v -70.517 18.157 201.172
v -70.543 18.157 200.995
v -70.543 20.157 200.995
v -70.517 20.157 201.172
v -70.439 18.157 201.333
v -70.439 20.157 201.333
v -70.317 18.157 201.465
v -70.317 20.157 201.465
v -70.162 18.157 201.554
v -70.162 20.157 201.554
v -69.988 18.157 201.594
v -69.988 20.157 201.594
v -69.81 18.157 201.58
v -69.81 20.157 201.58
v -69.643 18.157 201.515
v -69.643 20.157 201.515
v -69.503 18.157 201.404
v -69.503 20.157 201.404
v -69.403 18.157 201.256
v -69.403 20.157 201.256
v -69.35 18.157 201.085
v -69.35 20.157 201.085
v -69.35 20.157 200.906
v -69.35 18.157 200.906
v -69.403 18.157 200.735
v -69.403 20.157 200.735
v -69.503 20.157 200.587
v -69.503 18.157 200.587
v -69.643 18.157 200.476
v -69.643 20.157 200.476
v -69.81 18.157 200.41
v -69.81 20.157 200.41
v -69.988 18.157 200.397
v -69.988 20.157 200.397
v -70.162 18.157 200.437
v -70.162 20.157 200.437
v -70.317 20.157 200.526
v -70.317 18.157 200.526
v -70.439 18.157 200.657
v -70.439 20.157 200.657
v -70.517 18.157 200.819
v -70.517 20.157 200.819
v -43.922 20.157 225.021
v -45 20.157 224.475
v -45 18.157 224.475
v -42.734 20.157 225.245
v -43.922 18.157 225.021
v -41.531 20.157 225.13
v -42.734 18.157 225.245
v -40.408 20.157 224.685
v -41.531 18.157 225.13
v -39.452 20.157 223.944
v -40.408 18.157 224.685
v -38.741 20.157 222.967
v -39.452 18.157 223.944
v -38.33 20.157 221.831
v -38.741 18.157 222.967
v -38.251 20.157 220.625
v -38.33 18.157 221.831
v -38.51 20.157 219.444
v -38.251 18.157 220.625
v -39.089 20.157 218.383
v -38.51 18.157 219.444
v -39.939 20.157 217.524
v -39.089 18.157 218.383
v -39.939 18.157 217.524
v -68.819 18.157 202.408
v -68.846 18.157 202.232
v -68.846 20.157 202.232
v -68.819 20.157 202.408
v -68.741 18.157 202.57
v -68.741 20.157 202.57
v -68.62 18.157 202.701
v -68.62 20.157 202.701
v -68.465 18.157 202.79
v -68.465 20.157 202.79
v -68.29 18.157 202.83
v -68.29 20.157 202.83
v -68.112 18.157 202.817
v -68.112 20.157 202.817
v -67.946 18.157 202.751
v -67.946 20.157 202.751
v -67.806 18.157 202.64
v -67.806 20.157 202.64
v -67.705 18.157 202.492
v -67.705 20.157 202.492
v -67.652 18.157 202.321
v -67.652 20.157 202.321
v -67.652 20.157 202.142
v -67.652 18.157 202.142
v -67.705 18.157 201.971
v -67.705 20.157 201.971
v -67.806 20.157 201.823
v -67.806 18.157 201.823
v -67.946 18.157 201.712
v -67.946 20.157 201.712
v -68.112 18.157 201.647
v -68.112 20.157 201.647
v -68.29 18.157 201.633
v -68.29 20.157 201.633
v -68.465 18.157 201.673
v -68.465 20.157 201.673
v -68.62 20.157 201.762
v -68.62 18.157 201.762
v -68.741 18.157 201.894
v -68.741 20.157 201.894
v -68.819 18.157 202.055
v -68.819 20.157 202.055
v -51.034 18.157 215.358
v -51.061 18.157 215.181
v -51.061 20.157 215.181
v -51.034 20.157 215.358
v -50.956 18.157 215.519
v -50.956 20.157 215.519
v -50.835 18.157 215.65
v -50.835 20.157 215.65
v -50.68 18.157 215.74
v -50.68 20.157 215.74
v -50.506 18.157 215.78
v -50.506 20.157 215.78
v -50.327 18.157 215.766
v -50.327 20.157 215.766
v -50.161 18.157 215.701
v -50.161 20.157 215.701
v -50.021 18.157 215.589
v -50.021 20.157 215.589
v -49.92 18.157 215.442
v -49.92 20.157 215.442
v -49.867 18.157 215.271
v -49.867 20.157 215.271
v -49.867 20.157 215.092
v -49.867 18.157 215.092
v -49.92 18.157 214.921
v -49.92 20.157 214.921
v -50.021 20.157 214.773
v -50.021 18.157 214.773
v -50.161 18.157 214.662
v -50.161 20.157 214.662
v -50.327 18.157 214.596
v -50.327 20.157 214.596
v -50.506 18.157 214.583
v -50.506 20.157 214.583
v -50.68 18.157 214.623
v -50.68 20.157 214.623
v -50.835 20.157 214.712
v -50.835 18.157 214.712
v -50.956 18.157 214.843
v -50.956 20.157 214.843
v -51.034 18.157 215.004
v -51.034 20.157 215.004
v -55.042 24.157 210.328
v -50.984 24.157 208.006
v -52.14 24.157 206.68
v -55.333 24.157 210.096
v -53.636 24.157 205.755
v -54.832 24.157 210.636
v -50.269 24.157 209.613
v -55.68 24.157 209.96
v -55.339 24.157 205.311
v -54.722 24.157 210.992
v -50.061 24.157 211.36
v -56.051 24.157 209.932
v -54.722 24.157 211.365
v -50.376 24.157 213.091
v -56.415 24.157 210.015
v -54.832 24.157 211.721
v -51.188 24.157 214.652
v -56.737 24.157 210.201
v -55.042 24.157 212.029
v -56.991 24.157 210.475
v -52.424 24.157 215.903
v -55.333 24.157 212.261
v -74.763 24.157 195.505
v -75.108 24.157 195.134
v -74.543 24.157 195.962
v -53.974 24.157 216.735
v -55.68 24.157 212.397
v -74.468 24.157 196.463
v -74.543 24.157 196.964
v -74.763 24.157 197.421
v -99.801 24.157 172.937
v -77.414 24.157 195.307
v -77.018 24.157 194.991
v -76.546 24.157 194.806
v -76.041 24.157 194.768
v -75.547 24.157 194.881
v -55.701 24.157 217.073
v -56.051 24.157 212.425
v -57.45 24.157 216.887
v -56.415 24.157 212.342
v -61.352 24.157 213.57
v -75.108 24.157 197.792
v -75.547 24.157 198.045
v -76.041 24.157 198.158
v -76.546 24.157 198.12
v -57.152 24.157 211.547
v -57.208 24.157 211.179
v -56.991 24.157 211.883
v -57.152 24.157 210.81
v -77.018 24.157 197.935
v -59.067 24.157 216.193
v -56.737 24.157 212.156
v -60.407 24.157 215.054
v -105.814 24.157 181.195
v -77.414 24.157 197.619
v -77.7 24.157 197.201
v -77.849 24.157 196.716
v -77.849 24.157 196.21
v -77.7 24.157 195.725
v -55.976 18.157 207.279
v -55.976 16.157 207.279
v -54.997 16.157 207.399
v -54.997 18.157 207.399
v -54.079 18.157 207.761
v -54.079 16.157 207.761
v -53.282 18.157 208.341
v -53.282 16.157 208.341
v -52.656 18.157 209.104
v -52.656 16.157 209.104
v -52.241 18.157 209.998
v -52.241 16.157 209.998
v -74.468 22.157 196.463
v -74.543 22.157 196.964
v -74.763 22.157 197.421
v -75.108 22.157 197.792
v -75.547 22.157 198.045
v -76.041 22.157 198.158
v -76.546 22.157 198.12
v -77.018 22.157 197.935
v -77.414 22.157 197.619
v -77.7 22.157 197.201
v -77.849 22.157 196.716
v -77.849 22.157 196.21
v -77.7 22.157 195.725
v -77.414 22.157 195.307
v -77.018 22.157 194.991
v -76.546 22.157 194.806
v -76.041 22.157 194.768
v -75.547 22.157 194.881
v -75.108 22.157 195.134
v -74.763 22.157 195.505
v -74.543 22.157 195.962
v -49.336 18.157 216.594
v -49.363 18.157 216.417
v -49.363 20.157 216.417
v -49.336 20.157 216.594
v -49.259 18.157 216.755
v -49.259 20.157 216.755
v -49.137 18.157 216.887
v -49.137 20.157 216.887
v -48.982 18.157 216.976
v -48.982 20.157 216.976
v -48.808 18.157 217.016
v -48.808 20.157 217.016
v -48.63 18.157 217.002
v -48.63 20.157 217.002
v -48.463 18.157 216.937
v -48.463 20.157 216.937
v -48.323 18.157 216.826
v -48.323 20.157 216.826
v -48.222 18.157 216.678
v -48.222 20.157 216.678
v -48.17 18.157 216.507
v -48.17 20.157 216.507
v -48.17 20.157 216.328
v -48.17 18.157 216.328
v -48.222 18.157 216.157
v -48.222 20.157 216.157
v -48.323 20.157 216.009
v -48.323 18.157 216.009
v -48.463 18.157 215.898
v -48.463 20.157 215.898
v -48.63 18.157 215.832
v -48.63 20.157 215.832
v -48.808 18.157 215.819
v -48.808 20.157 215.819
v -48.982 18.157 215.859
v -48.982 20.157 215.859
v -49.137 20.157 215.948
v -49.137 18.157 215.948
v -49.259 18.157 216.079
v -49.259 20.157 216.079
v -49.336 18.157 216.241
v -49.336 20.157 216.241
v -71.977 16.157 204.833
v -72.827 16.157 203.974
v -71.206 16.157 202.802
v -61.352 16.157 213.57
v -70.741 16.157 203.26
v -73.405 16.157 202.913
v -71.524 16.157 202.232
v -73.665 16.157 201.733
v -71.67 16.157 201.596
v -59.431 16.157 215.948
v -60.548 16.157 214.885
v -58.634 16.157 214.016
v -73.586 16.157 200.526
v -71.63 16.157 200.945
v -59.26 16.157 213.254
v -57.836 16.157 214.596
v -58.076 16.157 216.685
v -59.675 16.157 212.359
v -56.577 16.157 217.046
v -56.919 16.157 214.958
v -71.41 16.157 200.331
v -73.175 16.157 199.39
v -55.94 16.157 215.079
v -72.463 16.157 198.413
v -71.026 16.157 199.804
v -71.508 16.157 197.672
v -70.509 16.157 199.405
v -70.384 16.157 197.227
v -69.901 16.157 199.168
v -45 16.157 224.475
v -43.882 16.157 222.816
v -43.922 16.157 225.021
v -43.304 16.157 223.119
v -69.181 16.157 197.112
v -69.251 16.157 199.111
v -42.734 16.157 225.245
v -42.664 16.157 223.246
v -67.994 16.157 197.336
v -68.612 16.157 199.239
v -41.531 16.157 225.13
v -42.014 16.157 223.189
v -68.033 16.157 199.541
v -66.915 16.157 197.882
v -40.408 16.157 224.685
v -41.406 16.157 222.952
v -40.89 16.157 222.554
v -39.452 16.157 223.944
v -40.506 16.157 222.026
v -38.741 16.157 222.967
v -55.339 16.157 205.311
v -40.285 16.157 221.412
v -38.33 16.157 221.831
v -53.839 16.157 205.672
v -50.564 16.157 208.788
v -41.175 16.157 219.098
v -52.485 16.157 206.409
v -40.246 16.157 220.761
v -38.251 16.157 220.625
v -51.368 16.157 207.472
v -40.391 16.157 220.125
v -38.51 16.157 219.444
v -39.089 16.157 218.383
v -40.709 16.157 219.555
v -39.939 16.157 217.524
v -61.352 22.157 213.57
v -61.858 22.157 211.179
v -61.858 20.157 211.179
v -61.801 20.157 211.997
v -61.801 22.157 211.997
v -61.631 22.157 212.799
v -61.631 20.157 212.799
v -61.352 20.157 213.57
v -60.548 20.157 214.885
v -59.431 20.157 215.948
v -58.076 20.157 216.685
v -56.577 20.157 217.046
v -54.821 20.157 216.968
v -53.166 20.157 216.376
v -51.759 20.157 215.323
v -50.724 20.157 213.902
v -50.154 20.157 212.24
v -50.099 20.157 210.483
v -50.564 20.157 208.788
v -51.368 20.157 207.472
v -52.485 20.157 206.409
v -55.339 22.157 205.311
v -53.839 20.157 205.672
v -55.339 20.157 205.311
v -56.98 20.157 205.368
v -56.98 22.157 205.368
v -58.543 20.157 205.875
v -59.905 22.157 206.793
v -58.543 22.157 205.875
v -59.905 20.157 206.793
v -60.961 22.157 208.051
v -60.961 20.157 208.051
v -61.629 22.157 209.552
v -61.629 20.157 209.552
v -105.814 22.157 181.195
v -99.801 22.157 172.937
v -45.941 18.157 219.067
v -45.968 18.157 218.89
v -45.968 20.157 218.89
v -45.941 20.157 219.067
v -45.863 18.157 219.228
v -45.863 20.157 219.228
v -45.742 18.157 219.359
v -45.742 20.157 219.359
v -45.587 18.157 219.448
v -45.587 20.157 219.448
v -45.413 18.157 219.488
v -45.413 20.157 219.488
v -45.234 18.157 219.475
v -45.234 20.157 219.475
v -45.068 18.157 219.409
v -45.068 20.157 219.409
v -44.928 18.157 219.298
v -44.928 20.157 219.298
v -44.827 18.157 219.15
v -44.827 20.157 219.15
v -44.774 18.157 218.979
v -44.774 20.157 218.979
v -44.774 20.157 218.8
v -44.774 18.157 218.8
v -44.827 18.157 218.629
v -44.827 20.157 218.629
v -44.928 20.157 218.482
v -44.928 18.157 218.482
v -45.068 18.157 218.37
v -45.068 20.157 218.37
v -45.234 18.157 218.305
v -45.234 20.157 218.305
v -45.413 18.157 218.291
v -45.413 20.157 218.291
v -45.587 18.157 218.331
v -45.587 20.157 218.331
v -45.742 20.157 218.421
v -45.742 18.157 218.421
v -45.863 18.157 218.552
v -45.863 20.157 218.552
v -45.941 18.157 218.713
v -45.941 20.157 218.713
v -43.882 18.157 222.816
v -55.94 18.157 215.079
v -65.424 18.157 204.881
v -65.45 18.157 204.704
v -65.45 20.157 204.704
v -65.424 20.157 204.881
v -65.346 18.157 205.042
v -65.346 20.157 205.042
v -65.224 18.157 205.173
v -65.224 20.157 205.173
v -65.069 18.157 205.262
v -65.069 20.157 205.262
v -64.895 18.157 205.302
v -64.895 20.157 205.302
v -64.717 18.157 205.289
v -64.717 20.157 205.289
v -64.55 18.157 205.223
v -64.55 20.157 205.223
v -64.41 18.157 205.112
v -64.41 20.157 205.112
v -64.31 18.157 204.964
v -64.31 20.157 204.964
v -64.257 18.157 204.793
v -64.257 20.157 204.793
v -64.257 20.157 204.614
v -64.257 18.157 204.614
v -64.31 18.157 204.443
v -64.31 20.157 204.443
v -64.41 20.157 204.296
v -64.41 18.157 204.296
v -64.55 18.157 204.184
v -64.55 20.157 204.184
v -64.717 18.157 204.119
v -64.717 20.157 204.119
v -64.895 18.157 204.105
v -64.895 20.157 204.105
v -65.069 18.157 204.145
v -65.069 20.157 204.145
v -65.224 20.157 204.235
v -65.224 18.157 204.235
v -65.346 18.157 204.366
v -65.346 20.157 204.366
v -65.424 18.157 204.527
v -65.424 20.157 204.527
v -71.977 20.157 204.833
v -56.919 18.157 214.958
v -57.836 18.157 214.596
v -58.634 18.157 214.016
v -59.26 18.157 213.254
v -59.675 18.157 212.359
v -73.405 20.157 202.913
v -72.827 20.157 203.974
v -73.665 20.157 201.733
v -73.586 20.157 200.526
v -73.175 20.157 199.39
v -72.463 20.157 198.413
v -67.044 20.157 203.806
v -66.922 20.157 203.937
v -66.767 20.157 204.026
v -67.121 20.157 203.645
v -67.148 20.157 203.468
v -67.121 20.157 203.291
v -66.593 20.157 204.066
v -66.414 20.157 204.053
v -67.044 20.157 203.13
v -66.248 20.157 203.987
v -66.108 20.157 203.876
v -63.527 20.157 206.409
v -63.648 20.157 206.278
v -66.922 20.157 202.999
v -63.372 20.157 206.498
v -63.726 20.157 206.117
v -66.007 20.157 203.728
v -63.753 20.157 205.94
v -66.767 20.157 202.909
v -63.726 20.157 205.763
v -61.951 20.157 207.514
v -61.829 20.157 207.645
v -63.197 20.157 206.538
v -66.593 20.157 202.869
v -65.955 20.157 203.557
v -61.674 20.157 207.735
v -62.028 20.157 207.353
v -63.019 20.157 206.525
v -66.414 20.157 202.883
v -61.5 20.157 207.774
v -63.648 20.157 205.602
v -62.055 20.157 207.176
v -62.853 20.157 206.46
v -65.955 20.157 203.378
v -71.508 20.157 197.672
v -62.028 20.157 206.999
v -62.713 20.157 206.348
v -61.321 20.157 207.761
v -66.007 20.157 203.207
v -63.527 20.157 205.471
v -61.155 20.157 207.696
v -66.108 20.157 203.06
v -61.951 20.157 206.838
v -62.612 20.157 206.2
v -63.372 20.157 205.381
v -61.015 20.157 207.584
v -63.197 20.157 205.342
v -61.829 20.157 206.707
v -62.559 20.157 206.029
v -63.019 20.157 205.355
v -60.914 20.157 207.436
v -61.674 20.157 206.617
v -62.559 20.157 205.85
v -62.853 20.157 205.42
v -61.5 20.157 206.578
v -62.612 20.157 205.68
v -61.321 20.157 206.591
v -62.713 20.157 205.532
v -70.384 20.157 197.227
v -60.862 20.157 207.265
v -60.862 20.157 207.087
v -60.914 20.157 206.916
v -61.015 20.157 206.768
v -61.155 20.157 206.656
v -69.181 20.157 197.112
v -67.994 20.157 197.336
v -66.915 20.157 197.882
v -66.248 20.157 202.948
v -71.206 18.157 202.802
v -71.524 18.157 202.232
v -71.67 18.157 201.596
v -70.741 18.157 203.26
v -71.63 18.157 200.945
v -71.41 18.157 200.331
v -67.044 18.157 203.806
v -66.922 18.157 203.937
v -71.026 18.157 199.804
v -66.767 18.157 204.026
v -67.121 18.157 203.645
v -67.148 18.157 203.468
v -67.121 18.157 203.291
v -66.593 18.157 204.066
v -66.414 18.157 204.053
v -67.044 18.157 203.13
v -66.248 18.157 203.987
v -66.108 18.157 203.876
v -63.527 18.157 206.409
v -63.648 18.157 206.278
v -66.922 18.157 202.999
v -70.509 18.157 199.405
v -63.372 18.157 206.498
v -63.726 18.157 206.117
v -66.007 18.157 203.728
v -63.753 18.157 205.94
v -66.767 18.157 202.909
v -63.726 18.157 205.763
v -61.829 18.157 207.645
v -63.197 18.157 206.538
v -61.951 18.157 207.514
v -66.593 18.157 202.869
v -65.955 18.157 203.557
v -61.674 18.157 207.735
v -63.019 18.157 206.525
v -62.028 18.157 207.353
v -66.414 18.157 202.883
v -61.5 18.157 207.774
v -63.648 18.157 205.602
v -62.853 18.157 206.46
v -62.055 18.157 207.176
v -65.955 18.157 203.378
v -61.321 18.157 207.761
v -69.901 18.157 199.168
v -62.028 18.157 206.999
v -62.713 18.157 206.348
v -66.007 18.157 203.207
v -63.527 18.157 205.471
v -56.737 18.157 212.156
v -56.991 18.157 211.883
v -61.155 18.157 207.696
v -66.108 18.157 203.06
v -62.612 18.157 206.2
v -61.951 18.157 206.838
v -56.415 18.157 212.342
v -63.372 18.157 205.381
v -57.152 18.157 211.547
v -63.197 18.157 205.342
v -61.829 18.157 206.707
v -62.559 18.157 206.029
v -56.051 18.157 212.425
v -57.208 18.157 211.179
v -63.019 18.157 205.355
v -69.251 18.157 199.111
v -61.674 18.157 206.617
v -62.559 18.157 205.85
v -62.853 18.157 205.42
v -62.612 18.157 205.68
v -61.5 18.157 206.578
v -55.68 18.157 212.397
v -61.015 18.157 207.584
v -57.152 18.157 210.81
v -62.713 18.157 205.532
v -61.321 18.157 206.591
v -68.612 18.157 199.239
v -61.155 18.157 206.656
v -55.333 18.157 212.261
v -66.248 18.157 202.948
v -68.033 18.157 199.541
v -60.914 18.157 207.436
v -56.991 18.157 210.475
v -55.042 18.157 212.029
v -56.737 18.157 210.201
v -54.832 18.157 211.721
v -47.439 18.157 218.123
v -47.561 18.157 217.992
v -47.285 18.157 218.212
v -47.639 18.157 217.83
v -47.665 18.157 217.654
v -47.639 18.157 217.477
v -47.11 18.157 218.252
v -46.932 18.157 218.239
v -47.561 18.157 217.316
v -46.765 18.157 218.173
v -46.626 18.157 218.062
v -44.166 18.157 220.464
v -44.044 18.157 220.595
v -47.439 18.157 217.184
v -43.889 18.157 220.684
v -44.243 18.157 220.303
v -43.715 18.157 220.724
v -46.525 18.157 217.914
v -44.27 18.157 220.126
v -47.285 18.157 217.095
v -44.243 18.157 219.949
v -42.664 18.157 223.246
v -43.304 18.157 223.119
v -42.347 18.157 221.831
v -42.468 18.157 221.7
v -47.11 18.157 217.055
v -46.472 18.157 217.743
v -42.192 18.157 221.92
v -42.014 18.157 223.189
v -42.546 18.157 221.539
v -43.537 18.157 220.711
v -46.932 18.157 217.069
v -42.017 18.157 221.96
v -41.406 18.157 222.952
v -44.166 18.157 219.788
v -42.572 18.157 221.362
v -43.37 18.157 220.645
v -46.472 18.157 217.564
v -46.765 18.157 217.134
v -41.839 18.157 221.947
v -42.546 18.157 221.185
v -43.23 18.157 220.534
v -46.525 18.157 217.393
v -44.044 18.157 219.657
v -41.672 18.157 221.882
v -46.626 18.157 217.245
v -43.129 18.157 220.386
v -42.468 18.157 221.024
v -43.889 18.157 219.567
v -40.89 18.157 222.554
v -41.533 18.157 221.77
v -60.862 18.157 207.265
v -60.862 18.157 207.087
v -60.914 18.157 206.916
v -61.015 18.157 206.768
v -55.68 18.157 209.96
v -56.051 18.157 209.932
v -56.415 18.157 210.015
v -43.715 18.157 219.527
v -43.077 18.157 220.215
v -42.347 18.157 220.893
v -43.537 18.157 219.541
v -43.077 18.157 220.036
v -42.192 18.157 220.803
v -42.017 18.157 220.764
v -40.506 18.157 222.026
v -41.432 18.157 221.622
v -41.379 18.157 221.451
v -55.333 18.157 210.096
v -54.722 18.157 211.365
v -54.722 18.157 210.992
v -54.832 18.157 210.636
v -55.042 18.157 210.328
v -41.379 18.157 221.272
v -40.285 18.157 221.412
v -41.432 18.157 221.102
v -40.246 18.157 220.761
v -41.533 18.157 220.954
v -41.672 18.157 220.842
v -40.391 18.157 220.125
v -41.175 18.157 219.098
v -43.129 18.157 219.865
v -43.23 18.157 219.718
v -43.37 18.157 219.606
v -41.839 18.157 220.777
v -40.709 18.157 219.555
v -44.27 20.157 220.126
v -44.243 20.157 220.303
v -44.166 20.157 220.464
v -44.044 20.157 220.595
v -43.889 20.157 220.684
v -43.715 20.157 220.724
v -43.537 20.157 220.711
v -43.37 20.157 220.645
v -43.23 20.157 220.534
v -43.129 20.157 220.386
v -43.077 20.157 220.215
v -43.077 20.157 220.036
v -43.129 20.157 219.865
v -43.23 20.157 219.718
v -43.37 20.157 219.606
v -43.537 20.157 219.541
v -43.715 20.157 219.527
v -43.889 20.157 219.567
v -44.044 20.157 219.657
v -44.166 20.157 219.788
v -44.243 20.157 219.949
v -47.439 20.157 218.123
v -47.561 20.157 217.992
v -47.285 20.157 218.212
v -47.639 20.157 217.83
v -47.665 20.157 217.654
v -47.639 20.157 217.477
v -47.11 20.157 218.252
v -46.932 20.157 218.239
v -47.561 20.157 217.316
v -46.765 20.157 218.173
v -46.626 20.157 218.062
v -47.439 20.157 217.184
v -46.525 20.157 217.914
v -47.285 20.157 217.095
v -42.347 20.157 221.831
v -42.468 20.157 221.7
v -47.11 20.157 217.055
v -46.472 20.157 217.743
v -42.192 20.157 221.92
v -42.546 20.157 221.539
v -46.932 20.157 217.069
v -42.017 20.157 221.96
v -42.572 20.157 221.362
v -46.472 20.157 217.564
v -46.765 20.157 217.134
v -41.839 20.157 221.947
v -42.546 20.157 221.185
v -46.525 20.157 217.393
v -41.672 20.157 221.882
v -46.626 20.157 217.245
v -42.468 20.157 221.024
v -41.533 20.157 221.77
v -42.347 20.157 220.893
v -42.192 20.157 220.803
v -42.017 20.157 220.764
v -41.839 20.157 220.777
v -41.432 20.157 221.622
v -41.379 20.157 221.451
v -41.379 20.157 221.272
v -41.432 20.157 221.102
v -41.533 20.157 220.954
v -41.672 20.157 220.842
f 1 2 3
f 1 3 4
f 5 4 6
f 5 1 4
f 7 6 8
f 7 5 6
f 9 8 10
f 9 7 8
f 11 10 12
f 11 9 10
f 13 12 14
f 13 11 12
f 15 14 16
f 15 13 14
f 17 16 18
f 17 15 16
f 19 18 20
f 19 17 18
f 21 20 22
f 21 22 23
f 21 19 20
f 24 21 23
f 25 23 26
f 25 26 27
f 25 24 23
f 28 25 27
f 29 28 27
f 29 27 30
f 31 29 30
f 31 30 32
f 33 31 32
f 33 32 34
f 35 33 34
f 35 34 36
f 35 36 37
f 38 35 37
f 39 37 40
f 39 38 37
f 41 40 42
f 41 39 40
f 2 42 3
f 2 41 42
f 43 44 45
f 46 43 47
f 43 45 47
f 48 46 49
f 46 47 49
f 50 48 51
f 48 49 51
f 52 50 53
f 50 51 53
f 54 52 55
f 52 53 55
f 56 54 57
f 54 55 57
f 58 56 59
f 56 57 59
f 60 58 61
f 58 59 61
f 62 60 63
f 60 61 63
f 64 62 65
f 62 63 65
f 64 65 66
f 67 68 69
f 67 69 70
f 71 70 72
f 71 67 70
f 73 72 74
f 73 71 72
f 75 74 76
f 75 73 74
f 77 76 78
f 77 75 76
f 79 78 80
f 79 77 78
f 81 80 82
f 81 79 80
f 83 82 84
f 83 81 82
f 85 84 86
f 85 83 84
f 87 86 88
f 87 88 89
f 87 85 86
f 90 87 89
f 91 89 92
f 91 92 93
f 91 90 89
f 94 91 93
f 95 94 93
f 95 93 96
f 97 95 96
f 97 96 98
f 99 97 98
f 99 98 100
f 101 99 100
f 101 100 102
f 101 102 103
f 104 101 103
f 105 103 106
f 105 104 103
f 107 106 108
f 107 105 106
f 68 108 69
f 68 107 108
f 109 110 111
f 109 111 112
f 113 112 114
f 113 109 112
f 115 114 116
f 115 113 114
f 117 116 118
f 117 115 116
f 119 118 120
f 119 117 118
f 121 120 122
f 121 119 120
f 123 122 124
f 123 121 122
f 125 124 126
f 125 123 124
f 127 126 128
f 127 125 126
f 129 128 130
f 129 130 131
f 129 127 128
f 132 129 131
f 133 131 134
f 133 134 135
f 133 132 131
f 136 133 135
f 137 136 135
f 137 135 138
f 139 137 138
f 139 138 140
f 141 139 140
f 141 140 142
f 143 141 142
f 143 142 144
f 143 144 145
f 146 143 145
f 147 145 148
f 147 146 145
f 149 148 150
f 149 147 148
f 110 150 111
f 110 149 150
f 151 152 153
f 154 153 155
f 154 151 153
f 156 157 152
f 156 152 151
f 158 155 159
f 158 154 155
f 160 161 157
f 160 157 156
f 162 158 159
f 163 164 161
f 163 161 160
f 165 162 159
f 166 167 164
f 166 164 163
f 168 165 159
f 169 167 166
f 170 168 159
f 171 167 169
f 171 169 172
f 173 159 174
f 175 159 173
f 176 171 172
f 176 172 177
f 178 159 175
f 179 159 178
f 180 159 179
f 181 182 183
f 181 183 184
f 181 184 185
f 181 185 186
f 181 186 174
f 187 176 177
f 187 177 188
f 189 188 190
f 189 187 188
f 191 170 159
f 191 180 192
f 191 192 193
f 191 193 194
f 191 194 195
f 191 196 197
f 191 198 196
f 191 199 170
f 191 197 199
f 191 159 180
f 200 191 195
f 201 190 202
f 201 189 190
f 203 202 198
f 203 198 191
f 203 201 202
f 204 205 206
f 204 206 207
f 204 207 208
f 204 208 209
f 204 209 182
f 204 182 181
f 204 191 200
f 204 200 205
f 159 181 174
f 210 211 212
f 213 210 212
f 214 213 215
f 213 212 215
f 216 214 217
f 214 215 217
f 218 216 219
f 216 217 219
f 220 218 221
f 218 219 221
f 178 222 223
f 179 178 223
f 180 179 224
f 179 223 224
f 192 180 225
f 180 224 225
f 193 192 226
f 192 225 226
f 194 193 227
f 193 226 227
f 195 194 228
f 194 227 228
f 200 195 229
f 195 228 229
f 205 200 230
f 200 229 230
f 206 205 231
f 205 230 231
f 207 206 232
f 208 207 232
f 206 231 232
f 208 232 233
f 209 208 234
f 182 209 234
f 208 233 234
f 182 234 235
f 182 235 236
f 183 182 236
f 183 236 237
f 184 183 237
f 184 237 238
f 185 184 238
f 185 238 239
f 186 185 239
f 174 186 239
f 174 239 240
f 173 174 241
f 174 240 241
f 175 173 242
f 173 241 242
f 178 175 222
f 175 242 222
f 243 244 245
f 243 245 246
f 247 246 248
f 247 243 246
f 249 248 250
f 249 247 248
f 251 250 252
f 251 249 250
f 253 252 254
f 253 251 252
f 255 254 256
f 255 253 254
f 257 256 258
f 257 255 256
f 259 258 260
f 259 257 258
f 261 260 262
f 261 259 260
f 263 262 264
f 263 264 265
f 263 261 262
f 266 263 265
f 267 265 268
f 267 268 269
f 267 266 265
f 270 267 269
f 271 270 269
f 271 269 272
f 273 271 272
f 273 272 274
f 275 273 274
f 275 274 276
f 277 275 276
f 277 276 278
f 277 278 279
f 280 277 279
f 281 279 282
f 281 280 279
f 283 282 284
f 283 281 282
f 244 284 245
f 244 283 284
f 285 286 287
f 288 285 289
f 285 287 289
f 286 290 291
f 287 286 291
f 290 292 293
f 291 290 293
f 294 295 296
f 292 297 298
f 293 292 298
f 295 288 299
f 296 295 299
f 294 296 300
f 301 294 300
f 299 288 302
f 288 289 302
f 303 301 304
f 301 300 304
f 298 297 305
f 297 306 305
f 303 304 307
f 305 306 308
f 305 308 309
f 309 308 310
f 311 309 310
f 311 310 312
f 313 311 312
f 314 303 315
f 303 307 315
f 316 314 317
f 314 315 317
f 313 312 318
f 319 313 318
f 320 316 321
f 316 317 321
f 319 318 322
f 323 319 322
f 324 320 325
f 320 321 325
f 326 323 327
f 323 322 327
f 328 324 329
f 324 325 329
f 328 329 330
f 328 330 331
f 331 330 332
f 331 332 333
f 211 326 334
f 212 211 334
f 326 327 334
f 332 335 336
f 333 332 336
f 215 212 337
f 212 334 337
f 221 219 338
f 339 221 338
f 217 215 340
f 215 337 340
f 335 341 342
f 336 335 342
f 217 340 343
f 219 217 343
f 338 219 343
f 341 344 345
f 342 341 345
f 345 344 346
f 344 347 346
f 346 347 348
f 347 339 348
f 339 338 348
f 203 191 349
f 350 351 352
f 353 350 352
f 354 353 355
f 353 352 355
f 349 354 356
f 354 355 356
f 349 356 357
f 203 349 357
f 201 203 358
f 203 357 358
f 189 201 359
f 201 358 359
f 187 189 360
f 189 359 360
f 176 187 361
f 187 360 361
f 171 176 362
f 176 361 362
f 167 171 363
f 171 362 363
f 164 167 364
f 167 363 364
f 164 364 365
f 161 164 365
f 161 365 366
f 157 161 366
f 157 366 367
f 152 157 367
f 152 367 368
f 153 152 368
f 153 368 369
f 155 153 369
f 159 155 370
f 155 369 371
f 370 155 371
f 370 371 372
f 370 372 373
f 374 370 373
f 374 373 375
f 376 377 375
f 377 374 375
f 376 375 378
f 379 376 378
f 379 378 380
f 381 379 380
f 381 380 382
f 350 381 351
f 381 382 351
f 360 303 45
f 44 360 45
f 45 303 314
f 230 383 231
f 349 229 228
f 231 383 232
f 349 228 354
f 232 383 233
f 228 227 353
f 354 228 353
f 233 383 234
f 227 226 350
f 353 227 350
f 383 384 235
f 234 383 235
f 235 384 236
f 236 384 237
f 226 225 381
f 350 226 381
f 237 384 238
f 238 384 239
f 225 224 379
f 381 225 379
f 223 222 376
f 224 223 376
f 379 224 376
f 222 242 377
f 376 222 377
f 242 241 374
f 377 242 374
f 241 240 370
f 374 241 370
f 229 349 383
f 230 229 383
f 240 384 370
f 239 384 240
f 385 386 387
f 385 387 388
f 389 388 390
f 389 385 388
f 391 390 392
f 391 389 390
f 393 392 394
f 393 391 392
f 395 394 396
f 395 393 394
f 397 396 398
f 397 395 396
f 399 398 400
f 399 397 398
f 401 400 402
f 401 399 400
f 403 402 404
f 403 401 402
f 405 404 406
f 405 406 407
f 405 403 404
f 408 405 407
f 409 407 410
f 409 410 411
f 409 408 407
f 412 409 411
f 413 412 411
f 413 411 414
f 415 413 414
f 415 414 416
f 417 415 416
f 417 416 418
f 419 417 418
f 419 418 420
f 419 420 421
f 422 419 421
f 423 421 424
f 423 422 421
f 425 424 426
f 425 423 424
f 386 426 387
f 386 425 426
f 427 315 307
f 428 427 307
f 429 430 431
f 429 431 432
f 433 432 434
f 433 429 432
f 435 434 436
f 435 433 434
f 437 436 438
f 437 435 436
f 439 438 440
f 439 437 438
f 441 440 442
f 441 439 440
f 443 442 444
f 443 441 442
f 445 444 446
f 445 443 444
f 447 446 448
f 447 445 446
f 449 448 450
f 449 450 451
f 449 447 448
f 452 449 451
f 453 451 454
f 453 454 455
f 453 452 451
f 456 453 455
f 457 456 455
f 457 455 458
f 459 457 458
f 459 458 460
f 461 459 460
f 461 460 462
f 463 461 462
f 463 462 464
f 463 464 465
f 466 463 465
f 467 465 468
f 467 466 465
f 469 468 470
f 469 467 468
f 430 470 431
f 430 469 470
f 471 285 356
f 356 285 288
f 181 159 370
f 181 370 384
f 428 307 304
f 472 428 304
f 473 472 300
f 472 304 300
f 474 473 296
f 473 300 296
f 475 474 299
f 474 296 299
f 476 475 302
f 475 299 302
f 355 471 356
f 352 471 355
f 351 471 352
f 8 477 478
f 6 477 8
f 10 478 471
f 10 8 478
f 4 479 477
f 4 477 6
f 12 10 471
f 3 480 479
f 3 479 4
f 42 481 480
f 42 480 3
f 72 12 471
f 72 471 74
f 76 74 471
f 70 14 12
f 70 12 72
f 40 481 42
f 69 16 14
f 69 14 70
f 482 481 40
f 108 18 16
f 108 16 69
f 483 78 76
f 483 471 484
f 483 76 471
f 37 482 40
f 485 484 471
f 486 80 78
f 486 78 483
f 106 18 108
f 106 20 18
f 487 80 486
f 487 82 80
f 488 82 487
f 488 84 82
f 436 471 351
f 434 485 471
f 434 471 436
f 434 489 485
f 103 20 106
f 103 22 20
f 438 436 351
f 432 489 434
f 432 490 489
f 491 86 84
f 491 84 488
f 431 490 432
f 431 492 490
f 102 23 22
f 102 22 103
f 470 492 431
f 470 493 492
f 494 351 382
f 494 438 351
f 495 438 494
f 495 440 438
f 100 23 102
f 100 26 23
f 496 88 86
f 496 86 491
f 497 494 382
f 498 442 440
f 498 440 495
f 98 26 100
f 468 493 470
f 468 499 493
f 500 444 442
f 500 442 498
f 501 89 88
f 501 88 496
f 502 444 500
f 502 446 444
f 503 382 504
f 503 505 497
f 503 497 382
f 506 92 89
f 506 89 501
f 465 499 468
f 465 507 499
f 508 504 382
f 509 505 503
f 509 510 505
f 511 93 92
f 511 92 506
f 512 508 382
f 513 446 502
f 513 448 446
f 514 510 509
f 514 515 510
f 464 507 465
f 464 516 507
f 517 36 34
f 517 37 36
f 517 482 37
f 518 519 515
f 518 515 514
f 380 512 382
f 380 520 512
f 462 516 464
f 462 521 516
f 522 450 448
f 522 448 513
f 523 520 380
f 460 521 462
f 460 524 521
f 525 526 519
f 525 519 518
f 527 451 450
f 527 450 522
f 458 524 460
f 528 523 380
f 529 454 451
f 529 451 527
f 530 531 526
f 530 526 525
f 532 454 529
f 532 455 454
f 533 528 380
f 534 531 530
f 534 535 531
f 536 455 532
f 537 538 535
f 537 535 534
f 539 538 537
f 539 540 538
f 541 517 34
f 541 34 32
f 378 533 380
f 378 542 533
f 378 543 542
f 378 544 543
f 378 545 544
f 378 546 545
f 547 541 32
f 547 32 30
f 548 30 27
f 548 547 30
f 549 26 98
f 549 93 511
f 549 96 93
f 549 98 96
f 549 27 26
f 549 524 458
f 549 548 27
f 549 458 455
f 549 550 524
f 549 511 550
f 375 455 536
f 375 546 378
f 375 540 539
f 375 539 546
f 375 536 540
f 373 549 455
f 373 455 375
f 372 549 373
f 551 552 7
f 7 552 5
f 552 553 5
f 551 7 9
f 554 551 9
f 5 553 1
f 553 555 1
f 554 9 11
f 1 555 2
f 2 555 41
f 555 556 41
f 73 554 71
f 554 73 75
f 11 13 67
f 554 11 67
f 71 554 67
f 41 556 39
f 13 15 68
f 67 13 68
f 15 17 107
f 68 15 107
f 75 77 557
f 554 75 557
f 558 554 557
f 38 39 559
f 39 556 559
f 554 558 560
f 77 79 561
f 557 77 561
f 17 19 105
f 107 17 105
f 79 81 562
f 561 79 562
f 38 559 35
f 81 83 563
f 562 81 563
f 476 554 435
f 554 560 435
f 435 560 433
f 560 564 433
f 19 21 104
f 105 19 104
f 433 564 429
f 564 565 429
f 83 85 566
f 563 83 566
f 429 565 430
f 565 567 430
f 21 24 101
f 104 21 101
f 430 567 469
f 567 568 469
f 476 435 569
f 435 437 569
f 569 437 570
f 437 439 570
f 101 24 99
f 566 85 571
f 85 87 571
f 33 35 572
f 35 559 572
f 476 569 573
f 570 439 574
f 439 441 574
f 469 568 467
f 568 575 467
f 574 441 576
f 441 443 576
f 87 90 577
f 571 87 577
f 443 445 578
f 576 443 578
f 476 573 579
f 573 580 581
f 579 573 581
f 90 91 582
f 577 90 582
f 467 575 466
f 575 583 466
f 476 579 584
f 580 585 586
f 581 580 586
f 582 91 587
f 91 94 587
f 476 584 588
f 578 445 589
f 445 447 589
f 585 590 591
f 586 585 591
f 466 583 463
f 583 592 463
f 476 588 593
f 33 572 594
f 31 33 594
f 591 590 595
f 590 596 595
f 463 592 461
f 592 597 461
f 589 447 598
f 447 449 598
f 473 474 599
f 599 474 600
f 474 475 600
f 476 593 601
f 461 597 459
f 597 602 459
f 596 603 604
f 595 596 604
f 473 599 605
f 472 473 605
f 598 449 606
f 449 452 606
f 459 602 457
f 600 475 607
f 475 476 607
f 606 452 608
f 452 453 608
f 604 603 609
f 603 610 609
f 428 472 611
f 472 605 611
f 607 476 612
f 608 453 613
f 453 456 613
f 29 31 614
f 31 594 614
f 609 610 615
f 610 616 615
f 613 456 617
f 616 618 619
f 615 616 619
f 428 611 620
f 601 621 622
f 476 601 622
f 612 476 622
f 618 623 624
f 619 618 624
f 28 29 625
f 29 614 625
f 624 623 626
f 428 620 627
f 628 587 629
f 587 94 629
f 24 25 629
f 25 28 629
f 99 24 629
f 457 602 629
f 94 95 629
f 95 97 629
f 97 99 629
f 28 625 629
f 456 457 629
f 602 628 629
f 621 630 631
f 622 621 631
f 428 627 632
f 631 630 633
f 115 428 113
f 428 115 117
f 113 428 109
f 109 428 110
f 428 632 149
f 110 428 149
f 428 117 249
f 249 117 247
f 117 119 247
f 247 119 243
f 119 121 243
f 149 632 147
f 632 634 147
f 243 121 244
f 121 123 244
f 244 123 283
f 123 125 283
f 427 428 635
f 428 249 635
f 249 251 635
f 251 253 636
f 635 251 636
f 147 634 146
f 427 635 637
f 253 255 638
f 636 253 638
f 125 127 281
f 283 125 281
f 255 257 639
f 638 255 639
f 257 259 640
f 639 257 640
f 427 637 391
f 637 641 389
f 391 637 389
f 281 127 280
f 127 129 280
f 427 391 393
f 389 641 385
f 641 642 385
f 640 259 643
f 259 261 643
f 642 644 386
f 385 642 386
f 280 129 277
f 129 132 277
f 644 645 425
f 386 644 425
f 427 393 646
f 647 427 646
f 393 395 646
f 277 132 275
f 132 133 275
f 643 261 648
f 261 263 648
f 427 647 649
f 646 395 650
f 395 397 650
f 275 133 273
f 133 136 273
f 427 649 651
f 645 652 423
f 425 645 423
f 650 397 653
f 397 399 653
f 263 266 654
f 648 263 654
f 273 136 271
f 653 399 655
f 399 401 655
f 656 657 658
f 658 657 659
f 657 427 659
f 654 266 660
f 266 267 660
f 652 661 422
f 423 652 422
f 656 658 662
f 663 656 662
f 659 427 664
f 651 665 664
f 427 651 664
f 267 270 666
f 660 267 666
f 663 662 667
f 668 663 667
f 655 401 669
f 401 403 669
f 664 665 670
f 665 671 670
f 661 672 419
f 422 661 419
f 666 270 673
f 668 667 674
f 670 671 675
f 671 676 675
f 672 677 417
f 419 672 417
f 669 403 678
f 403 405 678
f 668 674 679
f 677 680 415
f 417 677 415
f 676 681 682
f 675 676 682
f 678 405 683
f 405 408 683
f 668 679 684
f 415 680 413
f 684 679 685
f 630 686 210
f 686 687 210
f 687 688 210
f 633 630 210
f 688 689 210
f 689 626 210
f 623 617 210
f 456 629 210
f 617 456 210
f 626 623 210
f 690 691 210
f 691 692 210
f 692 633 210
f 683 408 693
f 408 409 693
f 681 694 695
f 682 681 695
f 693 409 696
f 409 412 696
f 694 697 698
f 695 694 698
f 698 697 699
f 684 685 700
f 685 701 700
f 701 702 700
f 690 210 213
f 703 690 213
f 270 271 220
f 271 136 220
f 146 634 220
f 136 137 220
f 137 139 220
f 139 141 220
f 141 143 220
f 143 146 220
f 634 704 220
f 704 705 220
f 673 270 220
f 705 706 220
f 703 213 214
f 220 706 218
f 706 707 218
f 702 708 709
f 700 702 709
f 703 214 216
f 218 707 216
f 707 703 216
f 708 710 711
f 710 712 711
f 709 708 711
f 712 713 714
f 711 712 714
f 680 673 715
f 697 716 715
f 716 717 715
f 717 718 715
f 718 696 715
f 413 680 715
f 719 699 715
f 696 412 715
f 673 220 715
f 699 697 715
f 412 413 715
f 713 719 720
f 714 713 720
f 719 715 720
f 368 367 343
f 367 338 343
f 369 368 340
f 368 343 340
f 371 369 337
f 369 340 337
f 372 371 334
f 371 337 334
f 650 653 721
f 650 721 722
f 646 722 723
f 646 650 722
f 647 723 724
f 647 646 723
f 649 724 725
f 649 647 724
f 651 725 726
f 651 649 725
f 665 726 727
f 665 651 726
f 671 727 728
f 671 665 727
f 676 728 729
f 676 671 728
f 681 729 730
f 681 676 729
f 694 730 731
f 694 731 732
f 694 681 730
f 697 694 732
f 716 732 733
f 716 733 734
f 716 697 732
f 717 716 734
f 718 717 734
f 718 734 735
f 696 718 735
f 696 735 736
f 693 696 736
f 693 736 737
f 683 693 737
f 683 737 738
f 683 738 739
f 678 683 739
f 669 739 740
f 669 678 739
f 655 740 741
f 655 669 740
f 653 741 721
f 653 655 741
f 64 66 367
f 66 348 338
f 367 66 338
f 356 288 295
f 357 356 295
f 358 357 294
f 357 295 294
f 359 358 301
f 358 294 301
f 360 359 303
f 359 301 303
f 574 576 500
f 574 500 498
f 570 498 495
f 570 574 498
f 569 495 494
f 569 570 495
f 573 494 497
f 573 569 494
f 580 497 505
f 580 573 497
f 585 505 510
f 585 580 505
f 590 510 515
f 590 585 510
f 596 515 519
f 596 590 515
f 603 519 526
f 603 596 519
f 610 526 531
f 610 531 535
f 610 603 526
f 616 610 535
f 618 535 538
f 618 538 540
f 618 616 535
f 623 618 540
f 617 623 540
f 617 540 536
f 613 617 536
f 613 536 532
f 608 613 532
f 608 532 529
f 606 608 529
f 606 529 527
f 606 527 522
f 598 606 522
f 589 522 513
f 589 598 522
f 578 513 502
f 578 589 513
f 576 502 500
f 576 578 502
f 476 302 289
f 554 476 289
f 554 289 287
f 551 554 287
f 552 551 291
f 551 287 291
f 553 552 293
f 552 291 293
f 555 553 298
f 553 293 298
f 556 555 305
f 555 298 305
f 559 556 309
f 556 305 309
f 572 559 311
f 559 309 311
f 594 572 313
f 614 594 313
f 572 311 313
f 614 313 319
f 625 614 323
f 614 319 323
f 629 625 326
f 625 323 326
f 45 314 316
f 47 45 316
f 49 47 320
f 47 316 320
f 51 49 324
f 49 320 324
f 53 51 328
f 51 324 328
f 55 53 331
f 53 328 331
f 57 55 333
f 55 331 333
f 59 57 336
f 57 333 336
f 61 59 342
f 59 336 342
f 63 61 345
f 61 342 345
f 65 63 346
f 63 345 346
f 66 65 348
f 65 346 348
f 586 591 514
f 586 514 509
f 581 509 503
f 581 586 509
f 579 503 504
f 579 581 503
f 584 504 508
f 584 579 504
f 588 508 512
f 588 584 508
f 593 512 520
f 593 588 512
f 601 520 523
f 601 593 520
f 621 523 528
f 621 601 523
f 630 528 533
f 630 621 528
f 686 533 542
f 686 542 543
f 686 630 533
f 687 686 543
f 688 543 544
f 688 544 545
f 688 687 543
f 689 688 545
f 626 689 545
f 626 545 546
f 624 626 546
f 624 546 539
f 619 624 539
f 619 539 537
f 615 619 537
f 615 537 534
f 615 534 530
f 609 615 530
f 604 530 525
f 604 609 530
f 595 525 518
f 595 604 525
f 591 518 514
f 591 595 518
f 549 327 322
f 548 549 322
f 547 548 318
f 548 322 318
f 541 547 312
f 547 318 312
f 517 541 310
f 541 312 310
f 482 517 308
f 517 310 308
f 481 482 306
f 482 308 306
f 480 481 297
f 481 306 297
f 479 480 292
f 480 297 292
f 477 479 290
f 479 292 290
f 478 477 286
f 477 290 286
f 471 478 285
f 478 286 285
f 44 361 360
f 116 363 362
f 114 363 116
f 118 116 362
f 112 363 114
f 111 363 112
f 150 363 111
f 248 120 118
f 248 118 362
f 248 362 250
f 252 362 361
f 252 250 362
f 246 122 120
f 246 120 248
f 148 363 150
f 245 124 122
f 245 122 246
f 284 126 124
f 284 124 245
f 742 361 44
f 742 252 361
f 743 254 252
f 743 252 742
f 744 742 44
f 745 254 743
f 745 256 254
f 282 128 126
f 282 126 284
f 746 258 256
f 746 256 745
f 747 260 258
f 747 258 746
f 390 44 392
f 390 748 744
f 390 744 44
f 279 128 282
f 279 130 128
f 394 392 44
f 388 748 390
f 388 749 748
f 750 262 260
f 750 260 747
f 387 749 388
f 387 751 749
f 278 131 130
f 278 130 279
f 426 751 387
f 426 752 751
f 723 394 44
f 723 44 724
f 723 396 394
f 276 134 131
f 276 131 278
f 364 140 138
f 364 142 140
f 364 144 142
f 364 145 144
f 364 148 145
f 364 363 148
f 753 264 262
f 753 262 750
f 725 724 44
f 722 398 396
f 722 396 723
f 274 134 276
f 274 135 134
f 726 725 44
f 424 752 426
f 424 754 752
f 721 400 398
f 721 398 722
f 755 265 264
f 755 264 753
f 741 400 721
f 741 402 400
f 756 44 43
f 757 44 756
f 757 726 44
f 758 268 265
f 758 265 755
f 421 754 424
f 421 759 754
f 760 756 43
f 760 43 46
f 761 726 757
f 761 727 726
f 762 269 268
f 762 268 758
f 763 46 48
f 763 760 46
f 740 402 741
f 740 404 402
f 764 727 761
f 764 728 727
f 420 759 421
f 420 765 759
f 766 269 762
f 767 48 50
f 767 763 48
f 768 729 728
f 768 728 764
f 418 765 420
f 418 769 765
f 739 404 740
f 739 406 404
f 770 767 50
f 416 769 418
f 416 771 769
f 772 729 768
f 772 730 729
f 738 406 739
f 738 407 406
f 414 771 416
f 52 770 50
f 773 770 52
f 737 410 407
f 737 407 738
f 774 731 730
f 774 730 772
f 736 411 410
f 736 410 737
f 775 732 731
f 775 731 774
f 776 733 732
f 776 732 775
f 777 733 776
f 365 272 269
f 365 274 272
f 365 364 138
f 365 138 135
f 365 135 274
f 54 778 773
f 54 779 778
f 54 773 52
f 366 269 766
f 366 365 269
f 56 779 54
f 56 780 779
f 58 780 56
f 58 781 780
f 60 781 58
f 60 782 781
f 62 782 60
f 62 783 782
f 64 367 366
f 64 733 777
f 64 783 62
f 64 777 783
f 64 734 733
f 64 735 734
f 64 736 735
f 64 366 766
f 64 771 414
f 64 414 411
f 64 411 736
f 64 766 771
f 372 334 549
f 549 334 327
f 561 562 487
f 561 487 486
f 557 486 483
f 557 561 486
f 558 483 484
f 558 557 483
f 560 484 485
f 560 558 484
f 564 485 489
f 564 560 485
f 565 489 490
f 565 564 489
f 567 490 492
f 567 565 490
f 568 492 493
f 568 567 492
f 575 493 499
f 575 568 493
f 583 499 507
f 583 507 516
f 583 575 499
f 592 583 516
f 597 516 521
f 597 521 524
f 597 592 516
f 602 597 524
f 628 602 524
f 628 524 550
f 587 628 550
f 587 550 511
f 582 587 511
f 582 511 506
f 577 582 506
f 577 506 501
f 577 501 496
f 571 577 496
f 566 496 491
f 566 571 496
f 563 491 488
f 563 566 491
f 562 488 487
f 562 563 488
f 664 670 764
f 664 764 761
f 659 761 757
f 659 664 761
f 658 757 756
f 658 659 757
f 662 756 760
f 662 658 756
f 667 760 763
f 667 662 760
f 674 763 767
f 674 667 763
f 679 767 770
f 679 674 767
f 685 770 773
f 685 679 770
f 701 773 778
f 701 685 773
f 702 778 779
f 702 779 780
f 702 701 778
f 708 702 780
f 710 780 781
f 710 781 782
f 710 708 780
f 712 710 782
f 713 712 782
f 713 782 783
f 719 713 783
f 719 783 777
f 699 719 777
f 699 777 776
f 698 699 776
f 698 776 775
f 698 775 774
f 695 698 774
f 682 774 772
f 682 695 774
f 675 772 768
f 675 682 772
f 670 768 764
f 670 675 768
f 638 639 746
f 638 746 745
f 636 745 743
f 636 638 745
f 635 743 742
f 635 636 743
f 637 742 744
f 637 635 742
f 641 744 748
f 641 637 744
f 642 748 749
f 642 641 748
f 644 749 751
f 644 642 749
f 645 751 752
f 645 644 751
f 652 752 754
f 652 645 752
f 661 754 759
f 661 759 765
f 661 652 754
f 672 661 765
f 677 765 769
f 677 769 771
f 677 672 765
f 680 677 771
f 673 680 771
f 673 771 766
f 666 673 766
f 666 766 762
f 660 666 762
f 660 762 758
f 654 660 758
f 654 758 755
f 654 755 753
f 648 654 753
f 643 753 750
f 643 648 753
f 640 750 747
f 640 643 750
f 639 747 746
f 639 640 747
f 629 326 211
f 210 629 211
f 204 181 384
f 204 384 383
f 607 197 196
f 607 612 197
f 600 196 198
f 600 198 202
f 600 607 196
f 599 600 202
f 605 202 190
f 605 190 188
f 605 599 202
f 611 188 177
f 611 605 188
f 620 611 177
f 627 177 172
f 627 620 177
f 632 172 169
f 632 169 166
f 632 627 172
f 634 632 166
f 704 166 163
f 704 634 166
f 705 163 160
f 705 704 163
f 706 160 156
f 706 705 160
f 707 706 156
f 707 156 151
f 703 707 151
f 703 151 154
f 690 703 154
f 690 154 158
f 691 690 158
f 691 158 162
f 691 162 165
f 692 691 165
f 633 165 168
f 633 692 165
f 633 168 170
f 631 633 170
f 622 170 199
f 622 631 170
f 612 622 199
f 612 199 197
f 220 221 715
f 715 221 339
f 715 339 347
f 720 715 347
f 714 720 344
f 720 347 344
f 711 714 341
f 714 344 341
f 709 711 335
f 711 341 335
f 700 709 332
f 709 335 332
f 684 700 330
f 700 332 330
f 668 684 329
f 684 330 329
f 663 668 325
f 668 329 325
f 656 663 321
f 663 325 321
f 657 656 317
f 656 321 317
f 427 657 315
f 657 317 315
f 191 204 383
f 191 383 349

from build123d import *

# Parameters (mm, degrees)
EXTRUDE_START       = -2
EXTRUDE_1_DEPTH     = 2
SKETCH_2_R          = 0.6
SKETCH_2_R_2        = 1.25
EXTRUDE_2_DEPTH     = 2
SKETCH_3_R          = 5.9
SKETCH_3_R_2        = 1.25
EXTRUDE_3_DEPTH     = 4
EXTRUDE_4_DEPTH     = 2
SKETCH_5_R          = 1.7
CUT_EXTRUDE_1_DEPTH = 2


# Read off the part's stored shape, not the designer's step: 填料-伸長1
with BuildPart() as part:
    # 填料-伸長1 outline → 填料-伸長1 (new body)
    with BuildSketch(Plane(origin=(0, 18.156954032, 0), x_dir=(1, 0, 0), z_dir=(0, 1, 0)).offset(EXTRUDE_START)):
        with BuildLine():
            Line((-71.976510321, -204.833021781), (-61.351692907, -213.569524655))
            ThreePointArc((-61.351692907, -213.569524655), (-59.430720516, -215.948258819), (-56.577073779, -217.046080048))
            Line((-56.577073779, -217.046080048), (-45.000342303, -224.475246616))
            ThreePointArc((-45.000342303, -224.475246616), (-39.062154339, -223.48095501), (-39.939141491, -217.524312867))
            Line((-39.939141491, -217.524312867), (-50.563958905, -208.787809993))
            ThreePointArc((-50.563958905, -208.787809993), (-52.484931296, -206.409075829), (-55.338578032, -205.3112546))
            Line((-55.338578032, -205.3112546), (-66.915309509, -197.882088033))
            ThreePointArc((-66.915309509, -197.882088033), (-72.853497472, -198.876379638), (-71.976510321, -204.833021781))
        make_face()
        with BuildLine():
            ThreePointArc((-55.939819286, -215.078625755), (-58.253468106, -214.331448143), (-59.674933886, -212.358967399))
            Line((-59.674933886, -212.358967399), (-70.741141251, -203.259521386))
            ThreePointArc((-70.741141251, -203.259521386), (-71.236686796, -200.053632048), (-68.033499603, -199.540910248))
            Line((-68.033499603, -199.540910248), (-55.975832526, -207.278708893))
            ThreePointArc((-55.975832526, -207.278708893), (-53.662183706, -208.025886506), (-52.240717926, -209.998367249))
            Line((-52.240717926, -209.998367249), (-41.17451056, -219.097813262))
            ThreePointArc((-41.17451056, -219.097813262), (-40.678965016, -222.303702601), (-43.882152209, -222.8164244))
            Line((-43.882152209, -222.8164244), (-55.939819286, -215.078625755))
        make_face(mode=Mode.SUBTRACT)
    extrude(amount=EXTRUDE_1_DEPTH)

    # 草圖2 → 填料-伸長2 (add)
    with BuildSketch(Plane(origin=(0, 18.156954032, 0), x_dir=(1, 0, 0), z_dir=(0, 1, 0))):
        with BuildLine():
            Line((-56.577073779, -217.046080048), (-45.000342303, -224.475246616))
            ThreePointArc((-45.000342303, -224.475246616), (-39.06215434, -223.480955011), (-39.939141491, -217.524312867))
            Line((-39.939141491, -217.524312867), (-50.563958905, -208.787809993))
            ThreePointArc((-50.563958905, -208.787809993), (-52.484931296, -206.409075829), (-55.338578032, -205.3112546))
            Line((-55.338578032, -205.3112546), (-66.915309509, -197.882088033))
            ThreePointArc((-66.915309509, -197.882088033), (-72.853497472, -198.876379638), (-71.976510321, -204.833021781))
            Line((-71.976510321, -204.833021781), (-61.351692907, -213.569524655))
            ThreePointArc((-61.351692907, -213.569524655), (-59.430720516, -215.948258819), (-56.577073779, -217.046080048))
        make_face()
        with Locations(Location((-69.943238255, -200.995433976, 0), (0, 0, 180))):
            Circle(SKETCH_2_R, mode=Mode.SUBTRACT)
        with Locations(Location((-68.245587045, -202.231549007, 0), (0, 0, 180))):
            Circle(SKETCH_2_R, mode=Mode.SUBTRACT)
        with Locations(Location((-66.547935835, -203.467664037, 0), (0, 0, 180))):
            Circle(SKETCH_2_R, mode=Mode.SUBTRACT)
        with Locations(Location((-64.850284625, -204.703779068, 0), (0, 0, 180))):
            Circle(SKETCH_2_R, mode=Mode.SUBTRACT)
        with Locations(Location((-63.152633415, -205.939894099, 0), (0, 0, 180))):
            Circle(SKETCH_2_R, mode=Mode.SUBTRACT)
        with Locations(Location((-61.454982205, -207.176009129, 0), (0, 0, 180))):
            Circle(SKETCH_2_R, mode=Mode.SUBTRACT)
        with Locations(Location((-55.957825906, -211.178667324, 0), (0, 0, 180))):
            Circle(SKETCH_2_R_2, mode=Mode.SUBTRACT)
        with Locations(Location((-50.460669607, -215.181325519, 0), (0, 0, 180))):
            Circle(SKETCH_2_R, mode=Mode.SUBTRACT)
        with Locations(Location((-48.763018397, -216.41744055, 0), (0, 0, 180))):
            Circle(SKETCH_2_R, mode=Mode.SUBTRACT)
        with Locations(Location((-47.065367187, -217.65355558, 0), (0, 0, 180))):
            Circle(SKETCH_2_R, mode=Mode.SUBTRACT)
        with Locations(Location((-45.367715977, -218.889670611, 0), (0, 0, 180))):
            Circle(SKETCH_2_R, mode=Mode.SUBTRACT)
        with Locations(Location((-43.670064767, -220.125785642, 0), (0, 0, 180))):
            Circle(SKETCH_2_R, mode=Mode.SUBTRACT)
        with Locations(Location((-41.972413557, -221.361900672, 0), (0, 0, 180))):
            Circle(SKETCH_2_R, mode=Mode.SUBTRACT)
    extrude(amount=EXTRUDE_2_DEPTH)

    # 草圖3 → 填料-伸長3 (add)
    with BuildSketch(Plane(origin=(0, 20.156954032, 0), x_dir=(1, 0, 0), z_dir=(0, 1, 0))):
        with Locations(Location((-55.957825906, -211.178667324, 0), (0, 0, 180))):
            Circle(SKETCH_3_R)
        with Locations(Location((-55.957825906, -211.178667324, 0), (0, 0, 180))):
            Circle(SKETCH_3_R_2, mode=Mode.SUBTRACT)
    extrude(amount=EXTRUDE_3_DEPTH)

    # 草圖4 → 填料-伸長4 (add)
    with BuildSketch(Plane(origin=(0, 24.156954032, 0), x_dir=(1, 0, 0), z_dir=(0, 1, 0))):
        Polygon((-61.351692907, -213.569524655), (-55.338578032, -205.3112546), (-99.800871628, -172.93681332), (-105.813986502, -181.195083375), align=None)
    extrude(amount=-EXTRUDE_4_DEPTH)

    # 草圖5 → 除料-伸長1 (cut)
    with BuildSketch(Plane.XZ.offset(-22.156954032)):
        with Locations((-76.167959358, 196.463012197)):
            Circle(SKETCH_5_R)
    extrude(amount=-CUT_EXTRUDE_1_DEPTH, mode=Mode.SUBTRACT)


solid = part.part
